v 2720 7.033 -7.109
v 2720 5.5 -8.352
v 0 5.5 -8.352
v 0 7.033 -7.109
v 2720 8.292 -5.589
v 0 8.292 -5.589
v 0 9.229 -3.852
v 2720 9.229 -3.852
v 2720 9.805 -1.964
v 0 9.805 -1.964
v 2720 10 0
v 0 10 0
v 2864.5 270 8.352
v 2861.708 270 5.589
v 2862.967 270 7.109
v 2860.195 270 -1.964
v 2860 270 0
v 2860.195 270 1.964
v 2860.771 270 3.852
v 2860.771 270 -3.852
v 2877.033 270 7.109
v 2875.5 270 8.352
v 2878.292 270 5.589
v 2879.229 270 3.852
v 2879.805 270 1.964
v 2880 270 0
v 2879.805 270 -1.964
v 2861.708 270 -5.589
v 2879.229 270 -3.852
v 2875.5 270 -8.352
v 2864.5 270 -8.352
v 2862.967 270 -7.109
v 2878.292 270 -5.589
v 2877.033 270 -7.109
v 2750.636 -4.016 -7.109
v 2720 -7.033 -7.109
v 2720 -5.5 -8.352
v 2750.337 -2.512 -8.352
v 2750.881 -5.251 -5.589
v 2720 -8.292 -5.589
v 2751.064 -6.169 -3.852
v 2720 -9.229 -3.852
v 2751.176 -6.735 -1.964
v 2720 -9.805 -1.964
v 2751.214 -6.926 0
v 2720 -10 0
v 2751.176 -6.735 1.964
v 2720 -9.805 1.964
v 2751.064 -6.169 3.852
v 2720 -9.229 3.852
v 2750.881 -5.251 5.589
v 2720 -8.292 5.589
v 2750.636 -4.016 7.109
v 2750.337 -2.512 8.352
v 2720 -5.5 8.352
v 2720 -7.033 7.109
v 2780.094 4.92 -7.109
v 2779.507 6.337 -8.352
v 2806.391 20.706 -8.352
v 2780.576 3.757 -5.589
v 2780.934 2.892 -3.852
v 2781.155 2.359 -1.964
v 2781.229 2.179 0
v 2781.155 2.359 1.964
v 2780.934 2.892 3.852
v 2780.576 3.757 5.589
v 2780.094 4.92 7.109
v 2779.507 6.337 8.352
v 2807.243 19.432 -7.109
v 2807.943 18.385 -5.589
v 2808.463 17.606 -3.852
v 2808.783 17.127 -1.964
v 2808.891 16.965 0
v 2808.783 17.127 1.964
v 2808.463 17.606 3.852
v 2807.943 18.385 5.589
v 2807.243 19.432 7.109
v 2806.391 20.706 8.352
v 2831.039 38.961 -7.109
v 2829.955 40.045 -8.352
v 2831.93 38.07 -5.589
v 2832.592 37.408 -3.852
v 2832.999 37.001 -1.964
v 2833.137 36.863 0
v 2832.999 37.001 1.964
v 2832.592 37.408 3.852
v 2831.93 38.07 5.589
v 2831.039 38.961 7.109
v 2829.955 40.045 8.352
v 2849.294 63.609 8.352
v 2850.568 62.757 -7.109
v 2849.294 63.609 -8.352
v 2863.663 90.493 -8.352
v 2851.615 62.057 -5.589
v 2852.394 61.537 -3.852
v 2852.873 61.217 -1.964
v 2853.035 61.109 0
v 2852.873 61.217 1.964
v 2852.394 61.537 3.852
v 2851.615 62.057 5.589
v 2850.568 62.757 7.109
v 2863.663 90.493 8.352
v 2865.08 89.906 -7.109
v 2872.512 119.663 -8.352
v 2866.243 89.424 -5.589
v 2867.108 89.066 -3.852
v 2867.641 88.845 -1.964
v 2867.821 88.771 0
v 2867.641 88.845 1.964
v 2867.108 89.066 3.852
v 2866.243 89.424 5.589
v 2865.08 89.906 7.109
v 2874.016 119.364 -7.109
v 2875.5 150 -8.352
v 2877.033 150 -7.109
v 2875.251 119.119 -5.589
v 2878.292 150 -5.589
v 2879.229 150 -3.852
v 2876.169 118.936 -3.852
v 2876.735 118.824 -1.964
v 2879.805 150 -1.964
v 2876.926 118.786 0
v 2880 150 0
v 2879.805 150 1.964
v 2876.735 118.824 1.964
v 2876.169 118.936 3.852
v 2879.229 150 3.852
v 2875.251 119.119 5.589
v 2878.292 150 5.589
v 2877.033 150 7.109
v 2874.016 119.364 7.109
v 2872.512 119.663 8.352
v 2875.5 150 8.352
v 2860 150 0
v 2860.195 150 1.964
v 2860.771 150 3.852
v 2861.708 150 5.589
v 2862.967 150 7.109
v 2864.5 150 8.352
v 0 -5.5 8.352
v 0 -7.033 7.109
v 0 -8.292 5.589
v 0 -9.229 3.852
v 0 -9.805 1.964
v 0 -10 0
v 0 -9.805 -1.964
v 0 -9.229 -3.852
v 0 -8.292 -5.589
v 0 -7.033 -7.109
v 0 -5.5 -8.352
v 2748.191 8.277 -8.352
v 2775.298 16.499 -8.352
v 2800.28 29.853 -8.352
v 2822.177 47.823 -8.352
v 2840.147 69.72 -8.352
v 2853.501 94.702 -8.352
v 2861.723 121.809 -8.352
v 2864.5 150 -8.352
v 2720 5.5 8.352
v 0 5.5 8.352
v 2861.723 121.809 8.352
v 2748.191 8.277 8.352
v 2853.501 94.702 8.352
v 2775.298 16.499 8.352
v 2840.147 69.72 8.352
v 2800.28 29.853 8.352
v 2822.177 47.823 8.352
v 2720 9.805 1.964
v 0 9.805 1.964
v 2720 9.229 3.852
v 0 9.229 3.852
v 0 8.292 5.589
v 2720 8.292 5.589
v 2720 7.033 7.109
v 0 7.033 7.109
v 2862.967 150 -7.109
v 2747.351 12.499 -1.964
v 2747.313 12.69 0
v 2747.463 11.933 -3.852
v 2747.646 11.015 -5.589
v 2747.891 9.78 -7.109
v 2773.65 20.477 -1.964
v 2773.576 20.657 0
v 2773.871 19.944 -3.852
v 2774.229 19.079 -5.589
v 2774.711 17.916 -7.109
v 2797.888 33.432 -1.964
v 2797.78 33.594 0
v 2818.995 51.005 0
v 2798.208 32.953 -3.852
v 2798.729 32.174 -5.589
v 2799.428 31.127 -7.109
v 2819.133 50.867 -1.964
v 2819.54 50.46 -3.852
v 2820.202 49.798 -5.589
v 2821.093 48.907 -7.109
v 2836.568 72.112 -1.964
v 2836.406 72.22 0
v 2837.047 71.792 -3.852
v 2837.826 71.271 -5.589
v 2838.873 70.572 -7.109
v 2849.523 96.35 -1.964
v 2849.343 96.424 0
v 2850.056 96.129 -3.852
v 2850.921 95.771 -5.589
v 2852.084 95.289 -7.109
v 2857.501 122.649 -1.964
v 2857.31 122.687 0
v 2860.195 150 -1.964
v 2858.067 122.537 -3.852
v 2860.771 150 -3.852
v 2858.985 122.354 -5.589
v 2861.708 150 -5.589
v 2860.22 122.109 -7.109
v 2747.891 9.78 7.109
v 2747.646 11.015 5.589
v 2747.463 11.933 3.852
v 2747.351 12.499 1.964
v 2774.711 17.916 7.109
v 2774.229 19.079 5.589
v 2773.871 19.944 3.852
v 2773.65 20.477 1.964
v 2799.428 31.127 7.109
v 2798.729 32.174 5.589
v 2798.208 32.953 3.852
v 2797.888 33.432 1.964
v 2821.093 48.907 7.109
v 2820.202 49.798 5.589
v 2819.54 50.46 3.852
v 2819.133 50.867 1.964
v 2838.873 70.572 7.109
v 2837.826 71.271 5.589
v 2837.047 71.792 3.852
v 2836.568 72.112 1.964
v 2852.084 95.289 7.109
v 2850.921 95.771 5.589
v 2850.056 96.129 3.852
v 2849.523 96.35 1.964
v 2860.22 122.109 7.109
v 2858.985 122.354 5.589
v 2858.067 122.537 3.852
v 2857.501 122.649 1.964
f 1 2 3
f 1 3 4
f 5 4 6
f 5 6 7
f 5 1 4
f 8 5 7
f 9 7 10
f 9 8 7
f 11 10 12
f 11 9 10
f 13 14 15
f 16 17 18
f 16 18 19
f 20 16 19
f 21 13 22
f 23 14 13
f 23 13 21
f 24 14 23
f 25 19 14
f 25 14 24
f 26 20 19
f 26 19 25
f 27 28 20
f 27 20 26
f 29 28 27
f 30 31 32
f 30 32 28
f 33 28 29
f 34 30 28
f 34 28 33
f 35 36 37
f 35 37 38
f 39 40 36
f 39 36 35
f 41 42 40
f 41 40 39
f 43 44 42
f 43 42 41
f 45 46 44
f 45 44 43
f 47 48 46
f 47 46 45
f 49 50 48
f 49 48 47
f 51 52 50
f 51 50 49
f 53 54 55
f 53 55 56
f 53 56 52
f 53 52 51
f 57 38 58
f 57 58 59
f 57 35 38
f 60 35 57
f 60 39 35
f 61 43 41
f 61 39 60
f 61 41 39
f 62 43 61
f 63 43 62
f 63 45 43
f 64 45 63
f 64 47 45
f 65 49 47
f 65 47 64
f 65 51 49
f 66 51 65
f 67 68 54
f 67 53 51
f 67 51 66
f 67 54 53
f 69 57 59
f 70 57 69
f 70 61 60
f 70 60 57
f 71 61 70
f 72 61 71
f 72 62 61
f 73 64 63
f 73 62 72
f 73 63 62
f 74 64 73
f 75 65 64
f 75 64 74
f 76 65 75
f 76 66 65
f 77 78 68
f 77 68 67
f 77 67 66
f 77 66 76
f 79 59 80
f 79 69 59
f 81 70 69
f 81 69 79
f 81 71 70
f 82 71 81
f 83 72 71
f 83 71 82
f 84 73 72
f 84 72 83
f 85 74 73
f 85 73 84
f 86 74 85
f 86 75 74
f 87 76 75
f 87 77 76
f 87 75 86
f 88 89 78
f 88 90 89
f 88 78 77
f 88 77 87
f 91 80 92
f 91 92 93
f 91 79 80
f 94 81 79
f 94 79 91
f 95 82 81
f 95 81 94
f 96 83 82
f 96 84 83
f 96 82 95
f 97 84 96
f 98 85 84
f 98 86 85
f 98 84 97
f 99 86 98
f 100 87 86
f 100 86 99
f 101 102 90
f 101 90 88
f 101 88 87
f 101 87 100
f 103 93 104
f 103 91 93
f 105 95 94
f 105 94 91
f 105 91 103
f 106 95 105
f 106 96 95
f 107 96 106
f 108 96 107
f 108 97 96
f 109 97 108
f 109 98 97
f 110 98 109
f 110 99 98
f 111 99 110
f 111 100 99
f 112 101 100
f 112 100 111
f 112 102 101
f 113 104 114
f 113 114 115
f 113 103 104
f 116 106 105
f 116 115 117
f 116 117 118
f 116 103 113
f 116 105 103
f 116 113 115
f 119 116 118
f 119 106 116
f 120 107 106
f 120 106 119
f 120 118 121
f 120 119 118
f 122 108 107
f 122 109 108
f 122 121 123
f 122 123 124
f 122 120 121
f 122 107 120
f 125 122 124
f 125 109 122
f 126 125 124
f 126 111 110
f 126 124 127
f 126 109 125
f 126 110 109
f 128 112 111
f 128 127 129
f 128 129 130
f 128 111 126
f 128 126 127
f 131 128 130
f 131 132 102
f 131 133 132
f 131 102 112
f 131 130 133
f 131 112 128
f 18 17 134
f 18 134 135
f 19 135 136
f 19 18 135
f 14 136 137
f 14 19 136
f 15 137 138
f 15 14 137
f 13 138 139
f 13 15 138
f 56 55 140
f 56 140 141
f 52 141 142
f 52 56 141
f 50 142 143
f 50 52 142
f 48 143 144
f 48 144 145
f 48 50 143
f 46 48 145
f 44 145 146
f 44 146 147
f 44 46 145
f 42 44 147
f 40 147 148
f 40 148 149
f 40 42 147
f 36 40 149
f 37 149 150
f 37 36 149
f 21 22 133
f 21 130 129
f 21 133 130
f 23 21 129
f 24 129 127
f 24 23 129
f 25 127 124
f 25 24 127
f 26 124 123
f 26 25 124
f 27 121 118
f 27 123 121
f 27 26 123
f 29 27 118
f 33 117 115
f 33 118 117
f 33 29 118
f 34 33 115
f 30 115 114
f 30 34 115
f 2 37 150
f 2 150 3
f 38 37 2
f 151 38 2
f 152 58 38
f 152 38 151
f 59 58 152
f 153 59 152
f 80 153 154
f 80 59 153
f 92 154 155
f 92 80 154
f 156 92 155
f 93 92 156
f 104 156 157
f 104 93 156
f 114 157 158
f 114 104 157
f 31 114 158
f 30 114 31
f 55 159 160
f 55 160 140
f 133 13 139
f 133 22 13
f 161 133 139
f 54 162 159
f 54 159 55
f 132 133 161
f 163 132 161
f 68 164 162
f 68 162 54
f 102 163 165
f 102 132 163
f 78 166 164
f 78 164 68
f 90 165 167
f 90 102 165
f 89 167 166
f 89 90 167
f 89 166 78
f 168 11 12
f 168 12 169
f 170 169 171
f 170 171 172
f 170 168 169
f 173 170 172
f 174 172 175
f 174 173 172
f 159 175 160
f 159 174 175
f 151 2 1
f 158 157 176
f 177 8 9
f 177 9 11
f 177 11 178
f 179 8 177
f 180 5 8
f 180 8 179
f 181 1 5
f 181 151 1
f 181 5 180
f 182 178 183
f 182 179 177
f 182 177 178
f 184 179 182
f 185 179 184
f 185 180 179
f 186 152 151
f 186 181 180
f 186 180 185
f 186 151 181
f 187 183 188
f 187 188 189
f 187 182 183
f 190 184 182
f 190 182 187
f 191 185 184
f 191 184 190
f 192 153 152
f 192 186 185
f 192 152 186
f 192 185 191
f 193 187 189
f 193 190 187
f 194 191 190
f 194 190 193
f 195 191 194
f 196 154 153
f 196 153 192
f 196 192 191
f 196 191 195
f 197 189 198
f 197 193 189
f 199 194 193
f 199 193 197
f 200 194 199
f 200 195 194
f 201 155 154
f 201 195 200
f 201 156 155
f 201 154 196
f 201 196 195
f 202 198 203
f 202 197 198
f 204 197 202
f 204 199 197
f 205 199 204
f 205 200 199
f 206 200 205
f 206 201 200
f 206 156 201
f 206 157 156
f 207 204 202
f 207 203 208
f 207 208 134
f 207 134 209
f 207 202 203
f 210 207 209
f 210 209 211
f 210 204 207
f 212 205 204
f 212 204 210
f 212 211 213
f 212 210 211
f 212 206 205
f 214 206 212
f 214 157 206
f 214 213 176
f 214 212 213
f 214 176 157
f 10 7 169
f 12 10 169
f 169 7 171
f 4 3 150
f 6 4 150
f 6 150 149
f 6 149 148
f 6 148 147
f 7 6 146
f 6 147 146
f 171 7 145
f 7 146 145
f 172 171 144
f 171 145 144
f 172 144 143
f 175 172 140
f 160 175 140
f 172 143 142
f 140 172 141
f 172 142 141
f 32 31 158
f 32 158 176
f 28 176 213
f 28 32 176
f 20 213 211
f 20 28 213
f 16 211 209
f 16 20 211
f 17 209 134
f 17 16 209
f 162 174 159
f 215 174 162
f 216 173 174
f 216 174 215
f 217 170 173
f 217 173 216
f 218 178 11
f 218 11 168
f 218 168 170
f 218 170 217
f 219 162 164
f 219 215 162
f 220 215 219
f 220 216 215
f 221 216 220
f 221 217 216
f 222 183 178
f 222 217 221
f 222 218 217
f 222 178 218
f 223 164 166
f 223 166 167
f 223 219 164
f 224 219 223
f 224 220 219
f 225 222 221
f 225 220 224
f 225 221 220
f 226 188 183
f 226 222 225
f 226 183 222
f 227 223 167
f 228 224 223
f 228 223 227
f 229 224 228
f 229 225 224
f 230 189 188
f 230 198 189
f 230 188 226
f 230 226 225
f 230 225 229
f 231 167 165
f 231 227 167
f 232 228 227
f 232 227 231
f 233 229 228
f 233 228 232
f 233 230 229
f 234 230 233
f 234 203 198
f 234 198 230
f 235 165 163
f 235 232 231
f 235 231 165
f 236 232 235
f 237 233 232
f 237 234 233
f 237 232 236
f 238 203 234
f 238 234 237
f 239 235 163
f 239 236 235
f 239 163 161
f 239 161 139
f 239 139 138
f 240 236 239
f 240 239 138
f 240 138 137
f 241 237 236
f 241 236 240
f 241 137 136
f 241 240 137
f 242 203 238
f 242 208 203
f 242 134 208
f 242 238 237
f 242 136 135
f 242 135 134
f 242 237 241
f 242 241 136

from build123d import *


with BuildPart() as f2:
    # F2: sweep along a path in F0
    with BuildLine(Plane.XY) as f2_path:
        Line((0, 0), (2720, 0))
        ThreePointArc((2720, 0), (2826.066017, 43.933983), (2870, 150))
        Line((2870, 150), (2870, 270))
    # F1 (on Right) → F2 (sweep)
    with BuildSketch(Plane.YZ):
        with BuildLine():
            ThreePointArc((5.5, -8.351647), (8.803408, -4.743416), (10, 0))
            ThreePointArc((10, 0), (8.803408, 4.743416), (5.5, 8.351647))
            Line((5.5, 8.351647), (-5.5, 8.351647))
            ThreePointArc((-5.5, 8.351647), (-10, 0), (-5.5, -8.351647))
            Line((-5.5, -8.351647), (5.5, -8.351647))
        make_face()
    sweep(path=f2_path.line)


solid = f2.part
